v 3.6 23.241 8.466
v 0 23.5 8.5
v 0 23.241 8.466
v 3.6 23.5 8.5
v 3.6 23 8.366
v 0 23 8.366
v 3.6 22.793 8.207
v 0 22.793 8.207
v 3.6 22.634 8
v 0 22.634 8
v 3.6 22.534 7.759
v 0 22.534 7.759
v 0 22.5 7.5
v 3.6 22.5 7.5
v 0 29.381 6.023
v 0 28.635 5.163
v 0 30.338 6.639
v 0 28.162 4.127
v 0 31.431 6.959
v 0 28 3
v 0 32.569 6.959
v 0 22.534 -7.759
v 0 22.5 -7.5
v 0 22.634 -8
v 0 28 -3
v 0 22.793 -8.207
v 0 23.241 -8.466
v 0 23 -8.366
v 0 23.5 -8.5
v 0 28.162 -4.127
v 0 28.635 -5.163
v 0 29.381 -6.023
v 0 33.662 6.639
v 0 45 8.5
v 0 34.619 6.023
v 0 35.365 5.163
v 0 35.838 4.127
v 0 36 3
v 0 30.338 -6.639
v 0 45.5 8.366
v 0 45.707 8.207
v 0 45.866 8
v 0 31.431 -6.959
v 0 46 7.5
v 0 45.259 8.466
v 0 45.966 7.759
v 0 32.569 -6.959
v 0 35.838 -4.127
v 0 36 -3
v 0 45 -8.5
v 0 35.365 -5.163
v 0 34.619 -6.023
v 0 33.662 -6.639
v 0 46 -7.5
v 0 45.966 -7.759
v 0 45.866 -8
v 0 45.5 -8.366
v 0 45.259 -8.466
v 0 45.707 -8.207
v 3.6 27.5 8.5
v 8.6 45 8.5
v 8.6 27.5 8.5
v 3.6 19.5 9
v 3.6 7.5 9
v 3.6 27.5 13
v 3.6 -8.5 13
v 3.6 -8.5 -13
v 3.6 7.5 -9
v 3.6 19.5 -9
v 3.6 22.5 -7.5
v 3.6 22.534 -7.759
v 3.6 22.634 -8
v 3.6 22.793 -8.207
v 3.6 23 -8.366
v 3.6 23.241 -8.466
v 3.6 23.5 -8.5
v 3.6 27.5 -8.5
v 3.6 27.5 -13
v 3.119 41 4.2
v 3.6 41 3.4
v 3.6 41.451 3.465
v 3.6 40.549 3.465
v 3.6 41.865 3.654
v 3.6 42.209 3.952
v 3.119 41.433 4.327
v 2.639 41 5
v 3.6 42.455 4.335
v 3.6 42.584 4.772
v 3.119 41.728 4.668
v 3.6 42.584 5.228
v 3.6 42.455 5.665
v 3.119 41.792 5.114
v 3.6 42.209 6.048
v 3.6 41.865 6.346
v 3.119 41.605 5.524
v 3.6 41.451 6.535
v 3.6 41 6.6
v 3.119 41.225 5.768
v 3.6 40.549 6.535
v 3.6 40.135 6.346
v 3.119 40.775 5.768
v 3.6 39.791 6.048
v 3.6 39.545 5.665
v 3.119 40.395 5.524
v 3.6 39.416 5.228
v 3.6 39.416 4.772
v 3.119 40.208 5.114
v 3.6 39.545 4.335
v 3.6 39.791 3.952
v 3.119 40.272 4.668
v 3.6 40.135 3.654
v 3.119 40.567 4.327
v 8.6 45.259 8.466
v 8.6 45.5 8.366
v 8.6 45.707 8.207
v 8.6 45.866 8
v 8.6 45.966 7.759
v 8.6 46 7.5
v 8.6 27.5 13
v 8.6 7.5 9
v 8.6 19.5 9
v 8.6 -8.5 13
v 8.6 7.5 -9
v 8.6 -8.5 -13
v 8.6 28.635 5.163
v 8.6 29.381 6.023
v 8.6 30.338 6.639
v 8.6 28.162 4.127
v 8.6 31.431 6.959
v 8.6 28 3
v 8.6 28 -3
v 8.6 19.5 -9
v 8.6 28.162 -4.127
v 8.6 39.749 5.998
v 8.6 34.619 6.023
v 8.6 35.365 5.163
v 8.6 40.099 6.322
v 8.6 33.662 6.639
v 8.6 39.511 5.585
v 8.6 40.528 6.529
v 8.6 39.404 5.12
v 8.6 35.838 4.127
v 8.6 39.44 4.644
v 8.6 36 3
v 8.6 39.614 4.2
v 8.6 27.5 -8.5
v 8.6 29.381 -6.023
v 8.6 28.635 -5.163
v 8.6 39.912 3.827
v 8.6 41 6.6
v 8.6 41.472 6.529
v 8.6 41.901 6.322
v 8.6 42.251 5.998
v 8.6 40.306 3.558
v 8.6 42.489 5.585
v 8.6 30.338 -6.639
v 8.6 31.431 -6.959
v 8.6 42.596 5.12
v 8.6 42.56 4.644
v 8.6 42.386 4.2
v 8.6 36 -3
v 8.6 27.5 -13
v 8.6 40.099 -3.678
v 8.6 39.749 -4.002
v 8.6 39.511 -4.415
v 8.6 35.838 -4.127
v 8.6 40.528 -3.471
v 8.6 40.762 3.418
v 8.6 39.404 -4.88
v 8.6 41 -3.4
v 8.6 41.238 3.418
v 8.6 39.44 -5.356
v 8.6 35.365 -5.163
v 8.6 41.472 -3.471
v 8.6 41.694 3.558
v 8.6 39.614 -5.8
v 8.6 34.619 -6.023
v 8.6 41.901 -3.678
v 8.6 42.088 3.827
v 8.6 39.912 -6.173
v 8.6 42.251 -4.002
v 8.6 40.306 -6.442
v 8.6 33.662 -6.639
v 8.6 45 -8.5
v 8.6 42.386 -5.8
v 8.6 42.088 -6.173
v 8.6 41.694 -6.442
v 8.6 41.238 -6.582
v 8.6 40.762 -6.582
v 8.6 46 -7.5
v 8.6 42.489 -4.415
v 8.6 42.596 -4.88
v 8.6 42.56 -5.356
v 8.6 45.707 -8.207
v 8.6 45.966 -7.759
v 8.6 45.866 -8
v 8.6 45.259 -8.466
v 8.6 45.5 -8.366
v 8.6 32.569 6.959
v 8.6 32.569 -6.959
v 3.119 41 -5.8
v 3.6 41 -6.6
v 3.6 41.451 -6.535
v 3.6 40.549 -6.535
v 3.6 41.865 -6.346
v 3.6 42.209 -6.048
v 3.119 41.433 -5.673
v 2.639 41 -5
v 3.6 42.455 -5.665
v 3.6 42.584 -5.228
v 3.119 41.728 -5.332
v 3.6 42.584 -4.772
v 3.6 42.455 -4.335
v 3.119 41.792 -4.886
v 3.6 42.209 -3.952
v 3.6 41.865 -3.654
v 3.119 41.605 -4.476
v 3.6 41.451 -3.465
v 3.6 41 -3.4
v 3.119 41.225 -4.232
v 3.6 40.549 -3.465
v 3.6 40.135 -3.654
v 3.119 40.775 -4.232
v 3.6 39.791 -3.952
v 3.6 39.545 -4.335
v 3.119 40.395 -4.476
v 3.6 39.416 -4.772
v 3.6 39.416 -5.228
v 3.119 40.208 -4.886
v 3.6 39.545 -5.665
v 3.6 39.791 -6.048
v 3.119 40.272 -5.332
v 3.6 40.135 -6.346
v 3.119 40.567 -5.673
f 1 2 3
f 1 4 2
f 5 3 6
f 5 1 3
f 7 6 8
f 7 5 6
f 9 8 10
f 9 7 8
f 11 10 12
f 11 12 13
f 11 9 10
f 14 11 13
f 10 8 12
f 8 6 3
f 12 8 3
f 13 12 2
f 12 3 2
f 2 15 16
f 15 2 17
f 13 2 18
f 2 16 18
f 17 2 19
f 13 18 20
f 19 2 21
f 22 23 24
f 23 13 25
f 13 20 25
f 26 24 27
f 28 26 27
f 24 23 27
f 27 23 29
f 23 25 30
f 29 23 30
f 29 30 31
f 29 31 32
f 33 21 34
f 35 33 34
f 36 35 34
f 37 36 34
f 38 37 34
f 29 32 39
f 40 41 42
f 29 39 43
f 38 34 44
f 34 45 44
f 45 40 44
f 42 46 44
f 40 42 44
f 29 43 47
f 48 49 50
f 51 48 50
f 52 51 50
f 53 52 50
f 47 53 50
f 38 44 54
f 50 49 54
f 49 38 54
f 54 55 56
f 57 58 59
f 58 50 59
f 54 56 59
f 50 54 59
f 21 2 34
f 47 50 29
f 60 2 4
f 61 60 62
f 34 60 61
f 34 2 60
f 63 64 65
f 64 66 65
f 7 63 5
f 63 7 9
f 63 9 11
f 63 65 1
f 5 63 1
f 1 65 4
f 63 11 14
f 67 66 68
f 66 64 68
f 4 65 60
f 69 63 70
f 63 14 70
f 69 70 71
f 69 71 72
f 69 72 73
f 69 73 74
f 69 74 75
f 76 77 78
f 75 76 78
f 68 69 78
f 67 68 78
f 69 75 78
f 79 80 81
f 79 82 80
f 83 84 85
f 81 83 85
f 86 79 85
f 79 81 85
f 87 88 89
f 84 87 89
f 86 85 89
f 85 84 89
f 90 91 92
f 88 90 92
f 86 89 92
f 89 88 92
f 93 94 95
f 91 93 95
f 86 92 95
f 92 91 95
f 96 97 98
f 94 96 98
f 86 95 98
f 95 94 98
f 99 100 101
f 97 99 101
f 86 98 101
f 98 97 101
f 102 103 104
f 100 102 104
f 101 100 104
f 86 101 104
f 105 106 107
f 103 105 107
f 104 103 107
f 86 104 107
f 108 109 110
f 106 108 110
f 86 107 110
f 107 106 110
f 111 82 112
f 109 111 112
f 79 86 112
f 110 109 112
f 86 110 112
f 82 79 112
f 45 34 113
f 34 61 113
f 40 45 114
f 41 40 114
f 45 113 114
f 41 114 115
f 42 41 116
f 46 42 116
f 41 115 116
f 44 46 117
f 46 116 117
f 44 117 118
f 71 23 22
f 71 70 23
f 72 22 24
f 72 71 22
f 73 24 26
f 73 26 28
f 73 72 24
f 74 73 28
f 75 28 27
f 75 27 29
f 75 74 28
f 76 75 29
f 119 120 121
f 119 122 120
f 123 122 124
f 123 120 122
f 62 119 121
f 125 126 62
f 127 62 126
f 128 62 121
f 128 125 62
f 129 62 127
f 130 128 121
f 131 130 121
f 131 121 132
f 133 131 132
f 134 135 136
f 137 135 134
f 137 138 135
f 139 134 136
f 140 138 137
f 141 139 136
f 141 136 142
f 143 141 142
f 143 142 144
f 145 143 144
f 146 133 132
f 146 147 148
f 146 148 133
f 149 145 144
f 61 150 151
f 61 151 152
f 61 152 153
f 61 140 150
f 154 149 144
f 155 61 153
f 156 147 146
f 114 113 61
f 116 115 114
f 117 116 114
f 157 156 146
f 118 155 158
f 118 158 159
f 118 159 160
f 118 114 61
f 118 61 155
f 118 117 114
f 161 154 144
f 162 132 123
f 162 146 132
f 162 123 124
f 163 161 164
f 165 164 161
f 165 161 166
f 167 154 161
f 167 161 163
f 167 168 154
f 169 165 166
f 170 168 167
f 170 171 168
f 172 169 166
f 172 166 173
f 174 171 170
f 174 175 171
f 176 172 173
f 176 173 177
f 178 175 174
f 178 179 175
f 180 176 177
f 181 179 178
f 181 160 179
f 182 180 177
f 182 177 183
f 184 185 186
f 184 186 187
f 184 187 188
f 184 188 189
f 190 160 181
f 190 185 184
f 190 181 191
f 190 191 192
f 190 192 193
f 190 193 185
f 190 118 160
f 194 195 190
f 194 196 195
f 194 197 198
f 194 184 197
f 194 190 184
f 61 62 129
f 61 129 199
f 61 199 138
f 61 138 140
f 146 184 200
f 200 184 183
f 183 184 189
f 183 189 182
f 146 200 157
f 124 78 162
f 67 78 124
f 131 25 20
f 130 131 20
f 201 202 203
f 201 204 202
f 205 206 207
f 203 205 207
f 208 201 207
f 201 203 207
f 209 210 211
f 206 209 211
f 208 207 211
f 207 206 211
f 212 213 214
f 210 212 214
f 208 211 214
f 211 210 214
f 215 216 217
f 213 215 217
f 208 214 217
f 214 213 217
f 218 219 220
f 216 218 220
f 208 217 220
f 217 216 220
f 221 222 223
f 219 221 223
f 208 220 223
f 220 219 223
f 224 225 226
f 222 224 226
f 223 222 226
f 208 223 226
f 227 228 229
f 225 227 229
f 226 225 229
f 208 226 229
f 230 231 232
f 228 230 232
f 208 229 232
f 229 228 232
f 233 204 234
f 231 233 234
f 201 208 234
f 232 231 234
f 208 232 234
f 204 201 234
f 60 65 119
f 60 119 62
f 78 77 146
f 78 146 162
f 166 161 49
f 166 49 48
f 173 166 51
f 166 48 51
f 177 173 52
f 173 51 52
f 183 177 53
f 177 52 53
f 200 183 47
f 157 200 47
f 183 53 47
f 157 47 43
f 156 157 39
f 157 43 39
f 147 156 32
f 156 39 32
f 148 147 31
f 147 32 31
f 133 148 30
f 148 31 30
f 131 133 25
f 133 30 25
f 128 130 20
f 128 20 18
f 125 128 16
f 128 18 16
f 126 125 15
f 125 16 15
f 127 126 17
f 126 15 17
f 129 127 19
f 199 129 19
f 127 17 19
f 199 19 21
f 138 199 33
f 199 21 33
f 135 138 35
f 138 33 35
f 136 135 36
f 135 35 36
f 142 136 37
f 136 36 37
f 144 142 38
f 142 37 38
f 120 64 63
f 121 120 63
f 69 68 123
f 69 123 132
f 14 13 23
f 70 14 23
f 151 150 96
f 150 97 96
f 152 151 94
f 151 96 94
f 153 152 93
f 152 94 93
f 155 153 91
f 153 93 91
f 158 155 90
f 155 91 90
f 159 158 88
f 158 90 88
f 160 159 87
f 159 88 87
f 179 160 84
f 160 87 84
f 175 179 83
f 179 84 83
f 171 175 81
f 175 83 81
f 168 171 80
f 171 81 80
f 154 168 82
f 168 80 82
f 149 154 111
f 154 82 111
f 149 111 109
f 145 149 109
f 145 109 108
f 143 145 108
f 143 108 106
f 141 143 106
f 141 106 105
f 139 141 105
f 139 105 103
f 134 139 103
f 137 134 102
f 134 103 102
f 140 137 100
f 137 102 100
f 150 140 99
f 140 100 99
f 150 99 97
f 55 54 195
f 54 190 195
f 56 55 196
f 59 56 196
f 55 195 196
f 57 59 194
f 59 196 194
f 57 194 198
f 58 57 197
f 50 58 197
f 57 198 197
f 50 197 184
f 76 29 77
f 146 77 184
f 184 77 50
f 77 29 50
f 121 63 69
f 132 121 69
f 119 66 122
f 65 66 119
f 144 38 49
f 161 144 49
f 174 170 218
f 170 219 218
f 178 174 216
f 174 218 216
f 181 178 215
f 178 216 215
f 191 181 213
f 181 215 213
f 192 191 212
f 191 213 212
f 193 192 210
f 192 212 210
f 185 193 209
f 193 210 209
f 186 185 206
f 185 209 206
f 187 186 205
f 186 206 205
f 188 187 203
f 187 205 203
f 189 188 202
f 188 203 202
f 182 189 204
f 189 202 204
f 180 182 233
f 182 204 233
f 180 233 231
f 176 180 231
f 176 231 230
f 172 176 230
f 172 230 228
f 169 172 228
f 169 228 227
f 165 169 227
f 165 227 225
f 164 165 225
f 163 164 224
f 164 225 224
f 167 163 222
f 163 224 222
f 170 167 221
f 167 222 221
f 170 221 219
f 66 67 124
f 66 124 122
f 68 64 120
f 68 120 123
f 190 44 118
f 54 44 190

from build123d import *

# Parameters (mm, degrees)
BOSS_EXTRUDE1_START      = 3.6
SKETCH2_W                = 22
SKETCH2_H                = 28
SKETCH2_W_2              = 18
SKETCH2_H_2              = 12
SKETCH2_W_3              = 4.5
SKETCH2_H_3              = 5
SKETCH2_W_4              = 17
BOSS_EXTRUDE1_DEPTH      = 5
SKETCH2_3_W              = 17
SKETCH2_3_H              = 5
BOSS_EXTRUDE2_DEPTH      = 8.6
SKETCH2_7_W              = 17
SKETCH2_7_H              = 18.5
BOSS_EXTRUDE3_DEPTH      = 8.6
M3_CLEARANCE_HOLE1_D     = 3.2
M3_CLEARANCE_HOLE1_DEPTH = 5
M3_CLEARANCE_HOLE1_TIP   = 0.96137699
FILLET1_R                = 1


with BuildPart() as part:
    # Sketch2 → Boss-Extrude1 (new body)
    # profile 1 of 5: a face of its own
    with BuildSketch(Plane(origin=(0, 0, 0), x_dir=(0, 0, -1), z_dir=(1, 0, 0)).offset(BOSS_EXTRUDE1_START)):
        Polygon((-13, 22.5), (-8.5, 22.5), (8.5, 22.5), (13, 22.5), (13, -8.5), (-13, -8.5), align=None)
        with Locations((0, 6.5)):
            Rectangle(SKETCH2_W, SKETCH2_H, mode=Mode.SUBTRACT)
    # profile 2 of 5: a face of its own
    with BuildSketch(Plane(origin=(0, 0, 0), x_dir=(0, 0, -1), z_dir=(1, 0, 0)).offset(BOSS_EXTRUDE1_START)):
        with Locations((0, 6.5)):
            Rectangle(SKETCH2_W, SKETCH2_H)
        with Locations((0, 13.5)):
            Rectangle(SKETCH2_W_2, SKETCH2_H_2, mode=Mode.SUBTRACT)
    # profile 3 of 5: a face of its own
    with BuildSketch(Plane(origin=(0, 0, 0), x_dir=(0, 0, -1), z_dir=(1, 0, 0)).offset(BOSS_EXTRUDE1_START)):
        with Locations((10.75, 25)):
            Rectangle(SKETCH2_W_3, SKETCH2_H_3)
    # profile 4 of 5: a face of its own
    with BuildSketch(Plane(origin=(0, 0, 0), x_dir=(0, 0, -1), z_dir=(1, 0, 0)).offset(BOSS_EXTRUDE1_START)):
        with Locations((0, 25)):
            Rectangle(SKETCH2_W_4, SKETCH2_H_3)
    # profile 5 of 5: a face of its own
    with BuildSketch(Plane(origin=(0, 0, 0), x_dir=(0, 0, -1), z_dir=(1, 0, 0)).offset(BOSS_EXTRUDE1_START)):
        with Locations((-10.75, 25)):
            Rectangle(SKETCH2_W_3, SKETCH2_H_3)
    extrude(amount=BOSS_EXTRUDE1_DEPTH)

    # Sketch2<3> → Boss-Extrude2 (add)
    with BuildSketch(Plane(origin=(0, 0, 0), x_dir=(0, 0, -1), z_dir=(1, 0, 0))):
        with Locations((0, 25)):
            Rectangle(SKETCH2_3_W, SKETCH2_3_H)
    extrude(amount=BOSS_EXTRUDE2_DEPTH)

    # Sketch2<7> → Boss-Extrude3 (add)
    with BuildSketch(Plane(origin=(0, 0, 0), x_dir=(0, 0, -1), z_dir=(1, 0, 0))):
        with Locations((0, 36.75)):
            Rectangle(SKETCH2_7_W, SKETCH2_7_H)
        with BuildLine():
            Line((3, 28), (-3, 28))
            ThreePointArc((-3, 28), (-7, 32), (-3, 36))
            Line((-3, 36), (3, 36))
            ThreePointArc((3, 36), (7, 32), (3, 28))
        make_face(mode=Mode.SUBTRACT)
    extrude(amount=BOSS_EXTRUDE3_DEPTH)

    # M3 Clearance Hole1
    with Locations(Plane(origin=(8.6, 0, 0), x_dir=(0, 0, -1), z_dir=(1, 0, 0))):
        with Locations((-5, 41), (5, 41)):
            Hole(M3_CLEARANCE_HOLE1_D / 2, depth=M3_CLEARANCE_HOLE1_DEPTH)
            with Locations((0, 0, -(M3_CLEARANCE_HOLE1_DEPTH + M3_CLEARANCE_HOLE1_TIP / 2))):  # 118° drill point
                Cone(0, M3_CLEARANCE_HOLE1_D / 2, M3_CLEARANCE_HOLE1_TIP, mode=Mode.SUBTRACT)

    # Fillet1
    fillet1_edges = [part.edges().sort_by_distance(p)[0] for p in [
        (1.8, 22.5, 8.5),
        (1.8, 22.5, -8.5),
        (4.3, 46, -8.5),
        (4.3, 46, 8.5),
    ]]
    fillet(fillet1_edges, radius=FILLET1_R)


solid = part.part
